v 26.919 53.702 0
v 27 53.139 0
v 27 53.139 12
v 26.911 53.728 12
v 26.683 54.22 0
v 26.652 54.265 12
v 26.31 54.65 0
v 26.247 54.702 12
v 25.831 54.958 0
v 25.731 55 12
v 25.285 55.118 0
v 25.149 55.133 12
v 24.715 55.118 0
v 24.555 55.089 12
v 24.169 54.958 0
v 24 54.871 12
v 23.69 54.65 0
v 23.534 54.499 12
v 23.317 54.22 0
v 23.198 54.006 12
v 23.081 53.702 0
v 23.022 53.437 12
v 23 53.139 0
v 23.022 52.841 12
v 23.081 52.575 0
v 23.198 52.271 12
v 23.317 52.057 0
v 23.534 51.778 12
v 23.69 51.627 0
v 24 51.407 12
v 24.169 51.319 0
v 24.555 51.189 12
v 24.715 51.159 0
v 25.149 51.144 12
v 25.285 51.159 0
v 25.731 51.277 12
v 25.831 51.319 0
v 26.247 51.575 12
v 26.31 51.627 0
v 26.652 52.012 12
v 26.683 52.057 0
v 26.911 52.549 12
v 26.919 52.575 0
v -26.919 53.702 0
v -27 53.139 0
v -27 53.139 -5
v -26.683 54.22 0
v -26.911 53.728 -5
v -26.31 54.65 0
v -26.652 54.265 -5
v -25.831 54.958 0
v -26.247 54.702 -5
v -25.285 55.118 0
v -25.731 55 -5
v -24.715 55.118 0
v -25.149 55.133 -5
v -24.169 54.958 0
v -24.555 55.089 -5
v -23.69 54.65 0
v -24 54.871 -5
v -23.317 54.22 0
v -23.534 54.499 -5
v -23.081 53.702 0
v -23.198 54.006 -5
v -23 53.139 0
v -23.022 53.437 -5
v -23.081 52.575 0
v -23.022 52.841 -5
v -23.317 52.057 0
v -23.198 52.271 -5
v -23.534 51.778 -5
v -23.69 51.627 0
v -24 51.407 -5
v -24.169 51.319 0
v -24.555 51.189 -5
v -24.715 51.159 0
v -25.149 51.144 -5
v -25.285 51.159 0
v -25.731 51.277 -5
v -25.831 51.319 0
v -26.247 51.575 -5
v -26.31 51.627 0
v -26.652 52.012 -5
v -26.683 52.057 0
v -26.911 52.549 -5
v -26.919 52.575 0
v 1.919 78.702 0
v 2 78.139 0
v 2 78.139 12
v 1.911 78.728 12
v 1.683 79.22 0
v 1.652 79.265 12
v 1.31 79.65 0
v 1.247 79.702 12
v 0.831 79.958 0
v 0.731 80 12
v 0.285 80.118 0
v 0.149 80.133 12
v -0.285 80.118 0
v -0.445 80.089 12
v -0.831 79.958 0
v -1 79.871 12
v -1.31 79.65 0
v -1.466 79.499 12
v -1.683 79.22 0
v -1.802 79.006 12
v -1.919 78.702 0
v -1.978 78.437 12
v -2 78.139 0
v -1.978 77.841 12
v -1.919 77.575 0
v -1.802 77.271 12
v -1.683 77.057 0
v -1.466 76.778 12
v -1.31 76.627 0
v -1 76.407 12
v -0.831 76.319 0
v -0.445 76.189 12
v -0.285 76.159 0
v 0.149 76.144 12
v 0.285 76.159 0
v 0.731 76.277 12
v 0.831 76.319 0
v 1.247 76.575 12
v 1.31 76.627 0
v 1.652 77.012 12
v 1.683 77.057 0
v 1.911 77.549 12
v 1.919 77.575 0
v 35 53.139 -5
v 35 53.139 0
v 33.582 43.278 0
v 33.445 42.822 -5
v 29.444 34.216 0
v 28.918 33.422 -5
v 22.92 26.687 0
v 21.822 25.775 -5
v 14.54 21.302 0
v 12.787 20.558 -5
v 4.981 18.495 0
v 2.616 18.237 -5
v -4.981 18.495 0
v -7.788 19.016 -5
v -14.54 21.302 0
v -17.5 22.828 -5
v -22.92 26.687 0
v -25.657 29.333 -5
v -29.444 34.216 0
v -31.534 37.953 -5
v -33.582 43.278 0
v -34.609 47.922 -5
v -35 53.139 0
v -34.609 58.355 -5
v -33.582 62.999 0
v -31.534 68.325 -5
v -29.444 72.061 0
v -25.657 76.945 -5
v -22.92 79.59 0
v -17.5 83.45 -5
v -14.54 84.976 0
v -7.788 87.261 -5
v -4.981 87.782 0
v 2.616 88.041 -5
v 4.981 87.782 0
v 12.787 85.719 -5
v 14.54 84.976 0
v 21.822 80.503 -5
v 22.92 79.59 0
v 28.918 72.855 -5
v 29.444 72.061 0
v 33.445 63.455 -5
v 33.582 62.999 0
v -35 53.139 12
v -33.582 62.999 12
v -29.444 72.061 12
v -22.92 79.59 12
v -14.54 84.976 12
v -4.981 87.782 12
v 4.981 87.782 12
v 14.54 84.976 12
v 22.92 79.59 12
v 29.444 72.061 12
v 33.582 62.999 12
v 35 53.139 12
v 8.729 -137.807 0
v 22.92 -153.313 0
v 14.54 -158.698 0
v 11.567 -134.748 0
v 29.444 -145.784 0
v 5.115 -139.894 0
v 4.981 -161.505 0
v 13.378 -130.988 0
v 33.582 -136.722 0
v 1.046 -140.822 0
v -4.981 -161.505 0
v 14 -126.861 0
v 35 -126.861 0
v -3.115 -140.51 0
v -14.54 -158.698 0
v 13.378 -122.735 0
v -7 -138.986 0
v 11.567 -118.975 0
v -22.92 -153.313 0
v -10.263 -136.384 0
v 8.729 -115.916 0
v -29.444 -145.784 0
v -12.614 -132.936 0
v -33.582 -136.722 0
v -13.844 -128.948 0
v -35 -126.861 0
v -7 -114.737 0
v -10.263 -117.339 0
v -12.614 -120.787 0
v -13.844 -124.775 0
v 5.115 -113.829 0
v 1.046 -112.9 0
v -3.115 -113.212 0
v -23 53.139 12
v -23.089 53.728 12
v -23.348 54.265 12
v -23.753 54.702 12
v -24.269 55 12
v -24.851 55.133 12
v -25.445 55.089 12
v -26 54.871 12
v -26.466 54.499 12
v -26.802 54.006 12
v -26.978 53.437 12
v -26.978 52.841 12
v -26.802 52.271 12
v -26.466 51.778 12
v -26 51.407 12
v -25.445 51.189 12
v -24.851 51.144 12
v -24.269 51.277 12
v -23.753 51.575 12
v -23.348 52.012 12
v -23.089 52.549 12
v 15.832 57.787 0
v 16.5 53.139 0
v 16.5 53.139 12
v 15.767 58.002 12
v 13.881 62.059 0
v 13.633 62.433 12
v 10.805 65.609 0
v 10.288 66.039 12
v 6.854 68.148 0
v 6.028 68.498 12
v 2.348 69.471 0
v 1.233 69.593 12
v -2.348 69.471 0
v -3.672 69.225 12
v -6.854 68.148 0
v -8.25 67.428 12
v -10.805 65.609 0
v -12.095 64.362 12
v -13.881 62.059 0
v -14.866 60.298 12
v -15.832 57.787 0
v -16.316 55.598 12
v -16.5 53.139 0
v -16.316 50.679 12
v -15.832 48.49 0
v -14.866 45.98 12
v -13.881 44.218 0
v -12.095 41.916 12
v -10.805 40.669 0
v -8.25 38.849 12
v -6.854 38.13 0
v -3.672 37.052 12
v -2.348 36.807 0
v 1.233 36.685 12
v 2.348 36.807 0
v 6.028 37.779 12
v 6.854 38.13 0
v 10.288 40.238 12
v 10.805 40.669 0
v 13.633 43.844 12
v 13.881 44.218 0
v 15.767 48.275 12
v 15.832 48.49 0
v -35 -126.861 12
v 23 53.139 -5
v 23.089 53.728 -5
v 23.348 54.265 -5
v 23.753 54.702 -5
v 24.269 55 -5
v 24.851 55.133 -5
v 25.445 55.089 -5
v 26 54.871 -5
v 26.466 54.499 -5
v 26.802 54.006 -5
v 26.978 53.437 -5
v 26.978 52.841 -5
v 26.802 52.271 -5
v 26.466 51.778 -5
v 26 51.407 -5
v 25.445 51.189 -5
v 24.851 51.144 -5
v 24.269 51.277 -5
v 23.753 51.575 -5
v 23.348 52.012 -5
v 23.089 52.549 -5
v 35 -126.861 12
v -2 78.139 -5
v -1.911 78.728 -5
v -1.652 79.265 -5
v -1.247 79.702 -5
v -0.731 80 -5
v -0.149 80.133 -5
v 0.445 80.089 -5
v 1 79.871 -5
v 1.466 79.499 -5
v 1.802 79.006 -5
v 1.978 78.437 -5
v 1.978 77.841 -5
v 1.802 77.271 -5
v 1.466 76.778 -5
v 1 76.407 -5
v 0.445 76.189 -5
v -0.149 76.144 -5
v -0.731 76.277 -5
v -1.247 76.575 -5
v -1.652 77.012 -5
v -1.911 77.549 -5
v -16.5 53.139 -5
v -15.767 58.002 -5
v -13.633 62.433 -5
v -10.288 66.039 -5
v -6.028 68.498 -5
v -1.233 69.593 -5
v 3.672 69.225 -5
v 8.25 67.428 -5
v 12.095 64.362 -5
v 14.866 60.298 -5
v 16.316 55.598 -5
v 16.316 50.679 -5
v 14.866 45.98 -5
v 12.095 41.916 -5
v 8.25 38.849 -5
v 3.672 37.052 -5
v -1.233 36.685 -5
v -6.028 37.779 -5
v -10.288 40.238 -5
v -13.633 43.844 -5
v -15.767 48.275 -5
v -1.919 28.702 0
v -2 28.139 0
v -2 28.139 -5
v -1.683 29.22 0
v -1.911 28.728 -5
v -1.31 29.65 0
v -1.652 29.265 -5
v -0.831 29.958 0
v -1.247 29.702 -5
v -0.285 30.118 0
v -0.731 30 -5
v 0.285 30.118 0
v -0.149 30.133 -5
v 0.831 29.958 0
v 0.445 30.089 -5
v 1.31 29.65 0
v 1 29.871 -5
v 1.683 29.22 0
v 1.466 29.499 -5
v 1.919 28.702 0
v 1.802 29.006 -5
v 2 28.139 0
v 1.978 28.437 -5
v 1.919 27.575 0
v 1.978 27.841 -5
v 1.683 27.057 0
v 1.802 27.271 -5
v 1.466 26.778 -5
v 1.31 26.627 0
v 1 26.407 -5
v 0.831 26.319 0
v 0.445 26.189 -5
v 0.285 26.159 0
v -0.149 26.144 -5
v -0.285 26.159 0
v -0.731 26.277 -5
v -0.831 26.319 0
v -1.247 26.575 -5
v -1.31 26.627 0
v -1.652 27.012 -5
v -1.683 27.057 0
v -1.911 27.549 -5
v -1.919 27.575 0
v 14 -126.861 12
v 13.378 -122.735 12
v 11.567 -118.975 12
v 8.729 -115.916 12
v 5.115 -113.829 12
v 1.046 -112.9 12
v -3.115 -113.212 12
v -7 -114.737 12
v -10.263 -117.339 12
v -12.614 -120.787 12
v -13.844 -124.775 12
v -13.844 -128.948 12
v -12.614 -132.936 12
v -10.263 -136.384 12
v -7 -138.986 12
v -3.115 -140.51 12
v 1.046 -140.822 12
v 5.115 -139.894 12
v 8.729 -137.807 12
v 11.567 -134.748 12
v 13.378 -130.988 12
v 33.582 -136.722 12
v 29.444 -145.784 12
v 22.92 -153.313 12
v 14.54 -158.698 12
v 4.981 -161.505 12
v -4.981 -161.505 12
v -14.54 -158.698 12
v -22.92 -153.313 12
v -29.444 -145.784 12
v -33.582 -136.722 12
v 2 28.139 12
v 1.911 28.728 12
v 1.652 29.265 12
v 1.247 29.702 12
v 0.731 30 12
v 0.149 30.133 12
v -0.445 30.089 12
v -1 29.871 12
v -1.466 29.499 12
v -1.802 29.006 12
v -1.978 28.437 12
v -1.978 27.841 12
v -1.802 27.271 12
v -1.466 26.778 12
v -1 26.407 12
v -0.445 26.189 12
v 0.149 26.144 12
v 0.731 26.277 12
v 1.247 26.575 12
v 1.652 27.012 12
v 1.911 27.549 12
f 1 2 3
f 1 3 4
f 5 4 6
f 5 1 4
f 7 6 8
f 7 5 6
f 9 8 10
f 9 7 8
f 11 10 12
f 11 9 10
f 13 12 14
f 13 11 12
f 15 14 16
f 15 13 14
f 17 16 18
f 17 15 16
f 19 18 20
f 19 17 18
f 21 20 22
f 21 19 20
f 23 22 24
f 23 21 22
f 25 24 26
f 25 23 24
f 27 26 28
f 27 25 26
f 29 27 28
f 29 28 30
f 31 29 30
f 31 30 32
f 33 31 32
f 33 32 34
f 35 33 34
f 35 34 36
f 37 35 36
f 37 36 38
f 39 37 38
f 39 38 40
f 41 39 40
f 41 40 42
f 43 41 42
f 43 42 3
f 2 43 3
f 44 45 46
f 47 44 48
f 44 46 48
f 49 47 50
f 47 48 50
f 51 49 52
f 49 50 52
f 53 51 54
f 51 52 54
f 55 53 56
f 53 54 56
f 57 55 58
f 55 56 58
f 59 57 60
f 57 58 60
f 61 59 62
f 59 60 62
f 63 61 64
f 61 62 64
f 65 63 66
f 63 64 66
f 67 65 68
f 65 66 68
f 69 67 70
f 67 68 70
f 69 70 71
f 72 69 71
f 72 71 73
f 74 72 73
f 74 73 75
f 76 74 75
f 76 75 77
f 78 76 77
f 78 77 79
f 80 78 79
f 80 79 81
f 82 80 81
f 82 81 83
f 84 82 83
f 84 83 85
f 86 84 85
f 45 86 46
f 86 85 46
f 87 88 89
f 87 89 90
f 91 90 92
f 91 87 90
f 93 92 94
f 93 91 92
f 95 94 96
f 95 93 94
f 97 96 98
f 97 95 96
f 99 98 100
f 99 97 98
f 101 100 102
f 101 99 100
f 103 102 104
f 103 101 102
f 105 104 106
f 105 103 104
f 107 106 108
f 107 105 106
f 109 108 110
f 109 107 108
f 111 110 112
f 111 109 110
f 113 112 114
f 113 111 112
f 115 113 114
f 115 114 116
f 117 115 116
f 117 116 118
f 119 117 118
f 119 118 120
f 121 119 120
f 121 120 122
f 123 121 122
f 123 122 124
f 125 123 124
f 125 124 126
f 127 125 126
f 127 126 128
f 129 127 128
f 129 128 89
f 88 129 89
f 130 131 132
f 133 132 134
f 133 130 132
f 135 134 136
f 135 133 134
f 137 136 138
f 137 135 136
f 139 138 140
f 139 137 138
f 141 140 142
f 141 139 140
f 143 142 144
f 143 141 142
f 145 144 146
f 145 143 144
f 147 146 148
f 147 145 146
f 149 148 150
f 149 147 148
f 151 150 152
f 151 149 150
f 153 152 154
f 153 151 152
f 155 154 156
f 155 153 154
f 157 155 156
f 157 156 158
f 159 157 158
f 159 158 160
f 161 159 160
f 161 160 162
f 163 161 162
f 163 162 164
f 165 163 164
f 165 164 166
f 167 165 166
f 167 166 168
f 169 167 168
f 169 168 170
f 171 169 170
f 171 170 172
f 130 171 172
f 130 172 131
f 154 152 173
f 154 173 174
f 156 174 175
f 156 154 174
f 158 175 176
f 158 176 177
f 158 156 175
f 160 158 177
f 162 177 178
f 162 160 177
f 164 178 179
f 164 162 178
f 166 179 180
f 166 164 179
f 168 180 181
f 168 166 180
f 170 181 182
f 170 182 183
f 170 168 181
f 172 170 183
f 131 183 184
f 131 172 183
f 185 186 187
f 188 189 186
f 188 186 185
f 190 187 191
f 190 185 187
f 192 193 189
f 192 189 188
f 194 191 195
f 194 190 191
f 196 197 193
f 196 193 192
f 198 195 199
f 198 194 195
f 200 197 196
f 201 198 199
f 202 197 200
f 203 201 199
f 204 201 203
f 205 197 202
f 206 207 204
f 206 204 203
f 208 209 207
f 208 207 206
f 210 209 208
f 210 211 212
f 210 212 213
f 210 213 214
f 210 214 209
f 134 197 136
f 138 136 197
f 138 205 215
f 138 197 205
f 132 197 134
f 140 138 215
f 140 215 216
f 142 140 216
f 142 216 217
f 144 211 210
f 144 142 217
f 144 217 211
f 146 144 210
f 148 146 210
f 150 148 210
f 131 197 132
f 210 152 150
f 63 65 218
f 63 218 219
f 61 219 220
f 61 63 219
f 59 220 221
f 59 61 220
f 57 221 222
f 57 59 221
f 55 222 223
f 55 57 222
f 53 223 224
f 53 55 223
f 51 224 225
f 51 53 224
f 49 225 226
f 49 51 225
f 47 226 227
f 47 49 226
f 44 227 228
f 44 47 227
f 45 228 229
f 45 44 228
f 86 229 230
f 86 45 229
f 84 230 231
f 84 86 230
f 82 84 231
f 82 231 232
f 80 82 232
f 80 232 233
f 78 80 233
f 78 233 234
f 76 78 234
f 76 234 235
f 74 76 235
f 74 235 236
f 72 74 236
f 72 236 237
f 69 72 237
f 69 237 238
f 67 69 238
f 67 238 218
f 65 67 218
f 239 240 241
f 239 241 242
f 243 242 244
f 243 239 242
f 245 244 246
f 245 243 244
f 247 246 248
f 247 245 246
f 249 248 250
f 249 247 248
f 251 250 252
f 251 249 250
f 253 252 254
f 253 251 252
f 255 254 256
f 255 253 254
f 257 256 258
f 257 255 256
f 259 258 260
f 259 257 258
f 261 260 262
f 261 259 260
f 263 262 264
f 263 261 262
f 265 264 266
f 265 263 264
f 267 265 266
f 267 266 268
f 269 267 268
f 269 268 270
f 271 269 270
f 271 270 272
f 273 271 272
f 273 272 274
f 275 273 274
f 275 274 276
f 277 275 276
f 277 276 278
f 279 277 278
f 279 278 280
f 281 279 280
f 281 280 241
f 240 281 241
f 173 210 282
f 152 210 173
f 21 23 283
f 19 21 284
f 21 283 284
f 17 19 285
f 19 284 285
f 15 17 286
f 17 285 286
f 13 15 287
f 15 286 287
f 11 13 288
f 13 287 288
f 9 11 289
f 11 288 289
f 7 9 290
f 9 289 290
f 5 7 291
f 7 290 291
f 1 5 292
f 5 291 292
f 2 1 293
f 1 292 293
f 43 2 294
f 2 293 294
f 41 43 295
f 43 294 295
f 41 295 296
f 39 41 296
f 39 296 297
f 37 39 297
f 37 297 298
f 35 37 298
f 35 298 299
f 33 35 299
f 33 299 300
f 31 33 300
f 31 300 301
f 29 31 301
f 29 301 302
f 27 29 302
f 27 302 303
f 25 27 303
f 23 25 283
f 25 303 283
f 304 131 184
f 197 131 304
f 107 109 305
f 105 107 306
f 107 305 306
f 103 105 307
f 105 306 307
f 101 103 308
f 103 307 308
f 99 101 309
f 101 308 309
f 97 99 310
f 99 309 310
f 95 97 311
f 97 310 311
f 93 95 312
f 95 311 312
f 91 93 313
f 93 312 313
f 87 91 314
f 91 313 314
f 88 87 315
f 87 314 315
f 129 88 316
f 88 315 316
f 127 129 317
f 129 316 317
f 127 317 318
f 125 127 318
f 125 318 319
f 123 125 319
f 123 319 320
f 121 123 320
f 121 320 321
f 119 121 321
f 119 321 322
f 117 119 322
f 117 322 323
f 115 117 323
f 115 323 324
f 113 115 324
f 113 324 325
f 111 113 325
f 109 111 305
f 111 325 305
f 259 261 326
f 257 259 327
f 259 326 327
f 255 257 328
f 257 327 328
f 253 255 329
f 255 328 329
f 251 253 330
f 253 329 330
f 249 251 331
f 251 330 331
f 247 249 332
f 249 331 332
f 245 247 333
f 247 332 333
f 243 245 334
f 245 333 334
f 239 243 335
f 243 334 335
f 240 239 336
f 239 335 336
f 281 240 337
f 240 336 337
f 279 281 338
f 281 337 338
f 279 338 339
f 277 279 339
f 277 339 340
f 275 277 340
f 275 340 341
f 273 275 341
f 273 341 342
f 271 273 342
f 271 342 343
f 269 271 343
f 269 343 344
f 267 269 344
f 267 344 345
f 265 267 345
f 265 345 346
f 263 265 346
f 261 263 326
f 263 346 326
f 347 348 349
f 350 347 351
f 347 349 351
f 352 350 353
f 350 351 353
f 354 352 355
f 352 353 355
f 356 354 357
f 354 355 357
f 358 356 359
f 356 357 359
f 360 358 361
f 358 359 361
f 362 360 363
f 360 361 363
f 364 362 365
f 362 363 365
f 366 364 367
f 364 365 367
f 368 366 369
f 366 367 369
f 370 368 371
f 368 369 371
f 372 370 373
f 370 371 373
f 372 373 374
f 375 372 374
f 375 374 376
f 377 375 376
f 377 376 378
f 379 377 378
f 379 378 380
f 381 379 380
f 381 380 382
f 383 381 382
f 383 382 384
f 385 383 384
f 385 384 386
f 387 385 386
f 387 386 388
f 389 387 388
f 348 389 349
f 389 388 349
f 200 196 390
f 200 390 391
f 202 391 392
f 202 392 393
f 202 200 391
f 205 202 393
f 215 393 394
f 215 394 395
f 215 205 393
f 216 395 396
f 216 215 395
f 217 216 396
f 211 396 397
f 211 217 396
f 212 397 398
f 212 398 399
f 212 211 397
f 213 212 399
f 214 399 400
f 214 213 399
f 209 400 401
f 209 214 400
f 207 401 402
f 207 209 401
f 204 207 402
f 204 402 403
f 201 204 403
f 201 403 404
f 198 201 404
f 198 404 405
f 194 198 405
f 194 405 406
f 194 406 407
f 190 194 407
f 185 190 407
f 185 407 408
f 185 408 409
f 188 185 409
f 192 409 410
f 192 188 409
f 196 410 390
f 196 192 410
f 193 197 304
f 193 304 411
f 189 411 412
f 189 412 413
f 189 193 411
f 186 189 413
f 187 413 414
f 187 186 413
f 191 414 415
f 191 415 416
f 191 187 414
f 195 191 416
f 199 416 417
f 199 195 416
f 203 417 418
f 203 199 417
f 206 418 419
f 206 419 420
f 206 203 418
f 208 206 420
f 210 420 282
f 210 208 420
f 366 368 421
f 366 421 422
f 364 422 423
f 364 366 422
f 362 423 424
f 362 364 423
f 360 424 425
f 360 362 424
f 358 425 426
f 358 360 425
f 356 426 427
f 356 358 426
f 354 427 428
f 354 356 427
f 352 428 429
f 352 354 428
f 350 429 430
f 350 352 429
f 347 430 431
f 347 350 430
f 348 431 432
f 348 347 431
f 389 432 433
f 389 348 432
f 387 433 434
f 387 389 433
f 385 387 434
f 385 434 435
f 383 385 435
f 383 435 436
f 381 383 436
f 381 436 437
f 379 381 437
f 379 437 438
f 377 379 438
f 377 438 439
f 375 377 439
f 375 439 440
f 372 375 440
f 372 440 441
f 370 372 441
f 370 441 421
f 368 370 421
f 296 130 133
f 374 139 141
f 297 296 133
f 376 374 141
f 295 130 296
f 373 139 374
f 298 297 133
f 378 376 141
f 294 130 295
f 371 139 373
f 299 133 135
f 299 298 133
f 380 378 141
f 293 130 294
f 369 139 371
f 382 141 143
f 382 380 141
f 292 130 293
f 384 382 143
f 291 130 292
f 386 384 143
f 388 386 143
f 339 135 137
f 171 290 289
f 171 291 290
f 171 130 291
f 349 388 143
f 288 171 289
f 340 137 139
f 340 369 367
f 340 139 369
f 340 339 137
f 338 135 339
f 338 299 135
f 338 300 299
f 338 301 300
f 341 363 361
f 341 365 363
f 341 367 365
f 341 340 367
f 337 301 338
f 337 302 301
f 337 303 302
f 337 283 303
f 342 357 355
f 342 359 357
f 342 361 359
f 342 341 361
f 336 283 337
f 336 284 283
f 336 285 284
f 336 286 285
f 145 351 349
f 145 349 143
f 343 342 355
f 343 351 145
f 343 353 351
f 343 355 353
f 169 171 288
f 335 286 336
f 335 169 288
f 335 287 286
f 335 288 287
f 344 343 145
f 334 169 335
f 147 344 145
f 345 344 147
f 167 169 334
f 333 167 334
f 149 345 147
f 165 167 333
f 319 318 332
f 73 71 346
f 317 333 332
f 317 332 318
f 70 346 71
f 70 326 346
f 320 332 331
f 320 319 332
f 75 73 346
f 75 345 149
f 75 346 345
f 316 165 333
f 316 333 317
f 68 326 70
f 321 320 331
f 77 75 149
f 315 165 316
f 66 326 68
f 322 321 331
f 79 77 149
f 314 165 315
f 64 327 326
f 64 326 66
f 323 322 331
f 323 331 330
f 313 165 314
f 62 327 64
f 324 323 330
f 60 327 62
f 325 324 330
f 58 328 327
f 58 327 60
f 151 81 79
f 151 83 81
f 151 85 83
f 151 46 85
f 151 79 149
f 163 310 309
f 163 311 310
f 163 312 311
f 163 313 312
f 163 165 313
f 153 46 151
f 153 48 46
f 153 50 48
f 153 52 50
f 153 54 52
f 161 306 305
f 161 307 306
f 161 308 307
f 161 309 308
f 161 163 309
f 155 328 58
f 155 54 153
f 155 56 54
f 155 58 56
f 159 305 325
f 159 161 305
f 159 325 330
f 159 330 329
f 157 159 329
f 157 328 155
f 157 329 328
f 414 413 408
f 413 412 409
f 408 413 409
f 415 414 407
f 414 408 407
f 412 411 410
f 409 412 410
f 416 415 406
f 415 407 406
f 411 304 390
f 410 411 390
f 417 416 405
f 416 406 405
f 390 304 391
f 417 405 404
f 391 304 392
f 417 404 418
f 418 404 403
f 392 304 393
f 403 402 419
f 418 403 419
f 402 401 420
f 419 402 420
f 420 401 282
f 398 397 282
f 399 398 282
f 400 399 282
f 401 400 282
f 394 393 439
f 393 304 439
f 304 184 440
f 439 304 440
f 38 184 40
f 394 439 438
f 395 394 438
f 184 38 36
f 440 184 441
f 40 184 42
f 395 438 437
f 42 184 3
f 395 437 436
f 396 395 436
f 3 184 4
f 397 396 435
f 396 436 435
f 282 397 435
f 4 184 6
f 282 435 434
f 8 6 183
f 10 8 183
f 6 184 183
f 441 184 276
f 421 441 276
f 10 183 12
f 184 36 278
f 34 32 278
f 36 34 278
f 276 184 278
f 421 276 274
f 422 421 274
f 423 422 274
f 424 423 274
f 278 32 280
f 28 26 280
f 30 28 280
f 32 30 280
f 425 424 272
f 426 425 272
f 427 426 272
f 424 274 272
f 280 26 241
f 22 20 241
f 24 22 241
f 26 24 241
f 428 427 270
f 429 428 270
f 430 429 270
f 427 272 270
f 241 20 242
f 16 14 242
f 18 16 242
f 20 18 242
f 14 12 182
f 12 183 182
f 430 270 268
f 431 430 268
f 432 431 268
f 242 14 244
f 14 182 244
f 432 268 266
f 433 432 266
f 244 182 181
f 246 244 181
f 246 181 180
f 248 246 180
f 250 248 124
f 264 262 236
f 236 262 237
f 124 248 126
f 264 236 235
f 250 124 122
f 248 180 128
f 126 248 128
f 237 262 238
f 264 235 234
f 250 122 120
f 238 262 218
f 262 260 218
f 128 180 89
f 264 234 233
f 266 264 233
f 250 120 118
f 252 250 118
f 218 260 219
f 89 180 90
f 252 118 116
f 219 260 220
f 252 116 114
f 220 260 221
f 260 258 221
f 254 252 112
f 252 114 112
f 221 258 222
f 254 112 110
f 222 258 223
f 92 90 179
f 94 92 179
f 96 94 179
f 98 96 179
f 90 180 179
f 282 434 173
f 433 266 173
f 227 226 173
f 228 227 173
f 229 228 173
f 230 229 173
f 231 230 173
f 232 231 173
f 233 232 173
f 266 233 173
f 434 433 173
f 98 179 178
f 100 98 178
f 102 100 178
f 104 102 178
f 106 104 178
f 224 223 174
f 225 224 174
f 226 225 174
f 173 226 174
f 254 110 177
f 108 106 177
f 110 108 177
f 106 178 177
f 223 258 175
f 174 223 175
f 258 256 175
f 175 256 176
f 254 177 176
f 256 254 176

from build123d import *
from build123d.topology import SkipClean

# Parameters (mm, degrees)
SKETCH2_R           = 16.5
SKETCH2_R_2         = 14
SKETCH2_R_3         = 2
BOSS_EXTRUDE1_DEPTH = 12
BOSS_EXTRUDE2_START = 5
SKETCH3_R           = 2
SKETCH3_R_2         = 16.5
BOSS_EXTRUDE2_DEPTH = 5


with BuildPart() as part:
    # Sketch2 → Boss-Extrude1 (new body)
    with BuildSketch(Plane.XY):
        with BuildLine():
            Line((35, 53.138686131), (35, -126.861313869))
            ThreePointArc((35, -126.861313869), (0, -161.861313869), (-35, -126.861313869))
            Line((-35, -126.861313869), (-35, 53.138686131))
            ThreePointArc((-35, 53.138686131), (0, 88.138686131), (35, 53.138686131))
        make_face()
        with Locations((0, 53.138686131)):
            Circle(SKETCH2_R, mode=Mode.SUBTRACT)
        with Locations((0, -126.861313869)):
            Circle(SKETCH2_R_2, mode=Mode.SUBTRACT)
        with Locations((0, 78.138686131)):
            Circle(SKETCH2_R_3, mode=Mode.SUBTRACT)
        with Locations((-25, 53.138686131)):
            Circle(SKETCH2_R_3, mode=Mode.SUBTRACT)
        with Locations((0, 28.138686131)):
            Circle(SKETCH2_R_3, mode=Mode.SUBTRACT)
        with Locations((25, 53.138686131)):
            Circle(SKETCH2_R_3, mode=Mode.SUBTRACT)
    extrude(amount=BOSS_EXTRUDE1_DEPTH)

    # Sketch3 → Boss-Extrude2 (add)
    with SkipClean():  # the faces are left unmerged after this step: merging them gives an invalid solid
        with BuildSketch(Plane(origin=(0, 0, 0), x_dir=(-1, 0, 0), z_dir=(0, 0, -1)).offset(BOSS_EXTRUDE2_START)):
            with BuildLine():
                ThreePointArc((35, 53.138686131), (0, 88.138686131), (-35, 53.138686131))
                ThreePointArc((-35, 53.138686131), (0, 18.138686131), (35, 53.138686131))
            make_face()
            with Locations((-25, 53.138686131)):
                Circle(SKETCH3_R, mode=Mode.SUBTRACT)
            with Locations((0, 28.138686131)):
                Circle(SKETCH3_R, mode=Mode.SUBTRACT)
            with Locations((0, 53.138686131)):
                Circle(SKETCH3_R_2, mode=Mode.SUBTRACT)
            with Locations((0, 78.138686131)):
                Circle(SKETCH3_R, mode=Mode.SUBTRACT)
            with Locations((25, 53.138686131)):
                Circle(SKETCH3_R, mode=Mode.SUBTRACT)
        extrude(amount=-BOSS_EXTRUDE2_DEPTH)


solid = part.part
